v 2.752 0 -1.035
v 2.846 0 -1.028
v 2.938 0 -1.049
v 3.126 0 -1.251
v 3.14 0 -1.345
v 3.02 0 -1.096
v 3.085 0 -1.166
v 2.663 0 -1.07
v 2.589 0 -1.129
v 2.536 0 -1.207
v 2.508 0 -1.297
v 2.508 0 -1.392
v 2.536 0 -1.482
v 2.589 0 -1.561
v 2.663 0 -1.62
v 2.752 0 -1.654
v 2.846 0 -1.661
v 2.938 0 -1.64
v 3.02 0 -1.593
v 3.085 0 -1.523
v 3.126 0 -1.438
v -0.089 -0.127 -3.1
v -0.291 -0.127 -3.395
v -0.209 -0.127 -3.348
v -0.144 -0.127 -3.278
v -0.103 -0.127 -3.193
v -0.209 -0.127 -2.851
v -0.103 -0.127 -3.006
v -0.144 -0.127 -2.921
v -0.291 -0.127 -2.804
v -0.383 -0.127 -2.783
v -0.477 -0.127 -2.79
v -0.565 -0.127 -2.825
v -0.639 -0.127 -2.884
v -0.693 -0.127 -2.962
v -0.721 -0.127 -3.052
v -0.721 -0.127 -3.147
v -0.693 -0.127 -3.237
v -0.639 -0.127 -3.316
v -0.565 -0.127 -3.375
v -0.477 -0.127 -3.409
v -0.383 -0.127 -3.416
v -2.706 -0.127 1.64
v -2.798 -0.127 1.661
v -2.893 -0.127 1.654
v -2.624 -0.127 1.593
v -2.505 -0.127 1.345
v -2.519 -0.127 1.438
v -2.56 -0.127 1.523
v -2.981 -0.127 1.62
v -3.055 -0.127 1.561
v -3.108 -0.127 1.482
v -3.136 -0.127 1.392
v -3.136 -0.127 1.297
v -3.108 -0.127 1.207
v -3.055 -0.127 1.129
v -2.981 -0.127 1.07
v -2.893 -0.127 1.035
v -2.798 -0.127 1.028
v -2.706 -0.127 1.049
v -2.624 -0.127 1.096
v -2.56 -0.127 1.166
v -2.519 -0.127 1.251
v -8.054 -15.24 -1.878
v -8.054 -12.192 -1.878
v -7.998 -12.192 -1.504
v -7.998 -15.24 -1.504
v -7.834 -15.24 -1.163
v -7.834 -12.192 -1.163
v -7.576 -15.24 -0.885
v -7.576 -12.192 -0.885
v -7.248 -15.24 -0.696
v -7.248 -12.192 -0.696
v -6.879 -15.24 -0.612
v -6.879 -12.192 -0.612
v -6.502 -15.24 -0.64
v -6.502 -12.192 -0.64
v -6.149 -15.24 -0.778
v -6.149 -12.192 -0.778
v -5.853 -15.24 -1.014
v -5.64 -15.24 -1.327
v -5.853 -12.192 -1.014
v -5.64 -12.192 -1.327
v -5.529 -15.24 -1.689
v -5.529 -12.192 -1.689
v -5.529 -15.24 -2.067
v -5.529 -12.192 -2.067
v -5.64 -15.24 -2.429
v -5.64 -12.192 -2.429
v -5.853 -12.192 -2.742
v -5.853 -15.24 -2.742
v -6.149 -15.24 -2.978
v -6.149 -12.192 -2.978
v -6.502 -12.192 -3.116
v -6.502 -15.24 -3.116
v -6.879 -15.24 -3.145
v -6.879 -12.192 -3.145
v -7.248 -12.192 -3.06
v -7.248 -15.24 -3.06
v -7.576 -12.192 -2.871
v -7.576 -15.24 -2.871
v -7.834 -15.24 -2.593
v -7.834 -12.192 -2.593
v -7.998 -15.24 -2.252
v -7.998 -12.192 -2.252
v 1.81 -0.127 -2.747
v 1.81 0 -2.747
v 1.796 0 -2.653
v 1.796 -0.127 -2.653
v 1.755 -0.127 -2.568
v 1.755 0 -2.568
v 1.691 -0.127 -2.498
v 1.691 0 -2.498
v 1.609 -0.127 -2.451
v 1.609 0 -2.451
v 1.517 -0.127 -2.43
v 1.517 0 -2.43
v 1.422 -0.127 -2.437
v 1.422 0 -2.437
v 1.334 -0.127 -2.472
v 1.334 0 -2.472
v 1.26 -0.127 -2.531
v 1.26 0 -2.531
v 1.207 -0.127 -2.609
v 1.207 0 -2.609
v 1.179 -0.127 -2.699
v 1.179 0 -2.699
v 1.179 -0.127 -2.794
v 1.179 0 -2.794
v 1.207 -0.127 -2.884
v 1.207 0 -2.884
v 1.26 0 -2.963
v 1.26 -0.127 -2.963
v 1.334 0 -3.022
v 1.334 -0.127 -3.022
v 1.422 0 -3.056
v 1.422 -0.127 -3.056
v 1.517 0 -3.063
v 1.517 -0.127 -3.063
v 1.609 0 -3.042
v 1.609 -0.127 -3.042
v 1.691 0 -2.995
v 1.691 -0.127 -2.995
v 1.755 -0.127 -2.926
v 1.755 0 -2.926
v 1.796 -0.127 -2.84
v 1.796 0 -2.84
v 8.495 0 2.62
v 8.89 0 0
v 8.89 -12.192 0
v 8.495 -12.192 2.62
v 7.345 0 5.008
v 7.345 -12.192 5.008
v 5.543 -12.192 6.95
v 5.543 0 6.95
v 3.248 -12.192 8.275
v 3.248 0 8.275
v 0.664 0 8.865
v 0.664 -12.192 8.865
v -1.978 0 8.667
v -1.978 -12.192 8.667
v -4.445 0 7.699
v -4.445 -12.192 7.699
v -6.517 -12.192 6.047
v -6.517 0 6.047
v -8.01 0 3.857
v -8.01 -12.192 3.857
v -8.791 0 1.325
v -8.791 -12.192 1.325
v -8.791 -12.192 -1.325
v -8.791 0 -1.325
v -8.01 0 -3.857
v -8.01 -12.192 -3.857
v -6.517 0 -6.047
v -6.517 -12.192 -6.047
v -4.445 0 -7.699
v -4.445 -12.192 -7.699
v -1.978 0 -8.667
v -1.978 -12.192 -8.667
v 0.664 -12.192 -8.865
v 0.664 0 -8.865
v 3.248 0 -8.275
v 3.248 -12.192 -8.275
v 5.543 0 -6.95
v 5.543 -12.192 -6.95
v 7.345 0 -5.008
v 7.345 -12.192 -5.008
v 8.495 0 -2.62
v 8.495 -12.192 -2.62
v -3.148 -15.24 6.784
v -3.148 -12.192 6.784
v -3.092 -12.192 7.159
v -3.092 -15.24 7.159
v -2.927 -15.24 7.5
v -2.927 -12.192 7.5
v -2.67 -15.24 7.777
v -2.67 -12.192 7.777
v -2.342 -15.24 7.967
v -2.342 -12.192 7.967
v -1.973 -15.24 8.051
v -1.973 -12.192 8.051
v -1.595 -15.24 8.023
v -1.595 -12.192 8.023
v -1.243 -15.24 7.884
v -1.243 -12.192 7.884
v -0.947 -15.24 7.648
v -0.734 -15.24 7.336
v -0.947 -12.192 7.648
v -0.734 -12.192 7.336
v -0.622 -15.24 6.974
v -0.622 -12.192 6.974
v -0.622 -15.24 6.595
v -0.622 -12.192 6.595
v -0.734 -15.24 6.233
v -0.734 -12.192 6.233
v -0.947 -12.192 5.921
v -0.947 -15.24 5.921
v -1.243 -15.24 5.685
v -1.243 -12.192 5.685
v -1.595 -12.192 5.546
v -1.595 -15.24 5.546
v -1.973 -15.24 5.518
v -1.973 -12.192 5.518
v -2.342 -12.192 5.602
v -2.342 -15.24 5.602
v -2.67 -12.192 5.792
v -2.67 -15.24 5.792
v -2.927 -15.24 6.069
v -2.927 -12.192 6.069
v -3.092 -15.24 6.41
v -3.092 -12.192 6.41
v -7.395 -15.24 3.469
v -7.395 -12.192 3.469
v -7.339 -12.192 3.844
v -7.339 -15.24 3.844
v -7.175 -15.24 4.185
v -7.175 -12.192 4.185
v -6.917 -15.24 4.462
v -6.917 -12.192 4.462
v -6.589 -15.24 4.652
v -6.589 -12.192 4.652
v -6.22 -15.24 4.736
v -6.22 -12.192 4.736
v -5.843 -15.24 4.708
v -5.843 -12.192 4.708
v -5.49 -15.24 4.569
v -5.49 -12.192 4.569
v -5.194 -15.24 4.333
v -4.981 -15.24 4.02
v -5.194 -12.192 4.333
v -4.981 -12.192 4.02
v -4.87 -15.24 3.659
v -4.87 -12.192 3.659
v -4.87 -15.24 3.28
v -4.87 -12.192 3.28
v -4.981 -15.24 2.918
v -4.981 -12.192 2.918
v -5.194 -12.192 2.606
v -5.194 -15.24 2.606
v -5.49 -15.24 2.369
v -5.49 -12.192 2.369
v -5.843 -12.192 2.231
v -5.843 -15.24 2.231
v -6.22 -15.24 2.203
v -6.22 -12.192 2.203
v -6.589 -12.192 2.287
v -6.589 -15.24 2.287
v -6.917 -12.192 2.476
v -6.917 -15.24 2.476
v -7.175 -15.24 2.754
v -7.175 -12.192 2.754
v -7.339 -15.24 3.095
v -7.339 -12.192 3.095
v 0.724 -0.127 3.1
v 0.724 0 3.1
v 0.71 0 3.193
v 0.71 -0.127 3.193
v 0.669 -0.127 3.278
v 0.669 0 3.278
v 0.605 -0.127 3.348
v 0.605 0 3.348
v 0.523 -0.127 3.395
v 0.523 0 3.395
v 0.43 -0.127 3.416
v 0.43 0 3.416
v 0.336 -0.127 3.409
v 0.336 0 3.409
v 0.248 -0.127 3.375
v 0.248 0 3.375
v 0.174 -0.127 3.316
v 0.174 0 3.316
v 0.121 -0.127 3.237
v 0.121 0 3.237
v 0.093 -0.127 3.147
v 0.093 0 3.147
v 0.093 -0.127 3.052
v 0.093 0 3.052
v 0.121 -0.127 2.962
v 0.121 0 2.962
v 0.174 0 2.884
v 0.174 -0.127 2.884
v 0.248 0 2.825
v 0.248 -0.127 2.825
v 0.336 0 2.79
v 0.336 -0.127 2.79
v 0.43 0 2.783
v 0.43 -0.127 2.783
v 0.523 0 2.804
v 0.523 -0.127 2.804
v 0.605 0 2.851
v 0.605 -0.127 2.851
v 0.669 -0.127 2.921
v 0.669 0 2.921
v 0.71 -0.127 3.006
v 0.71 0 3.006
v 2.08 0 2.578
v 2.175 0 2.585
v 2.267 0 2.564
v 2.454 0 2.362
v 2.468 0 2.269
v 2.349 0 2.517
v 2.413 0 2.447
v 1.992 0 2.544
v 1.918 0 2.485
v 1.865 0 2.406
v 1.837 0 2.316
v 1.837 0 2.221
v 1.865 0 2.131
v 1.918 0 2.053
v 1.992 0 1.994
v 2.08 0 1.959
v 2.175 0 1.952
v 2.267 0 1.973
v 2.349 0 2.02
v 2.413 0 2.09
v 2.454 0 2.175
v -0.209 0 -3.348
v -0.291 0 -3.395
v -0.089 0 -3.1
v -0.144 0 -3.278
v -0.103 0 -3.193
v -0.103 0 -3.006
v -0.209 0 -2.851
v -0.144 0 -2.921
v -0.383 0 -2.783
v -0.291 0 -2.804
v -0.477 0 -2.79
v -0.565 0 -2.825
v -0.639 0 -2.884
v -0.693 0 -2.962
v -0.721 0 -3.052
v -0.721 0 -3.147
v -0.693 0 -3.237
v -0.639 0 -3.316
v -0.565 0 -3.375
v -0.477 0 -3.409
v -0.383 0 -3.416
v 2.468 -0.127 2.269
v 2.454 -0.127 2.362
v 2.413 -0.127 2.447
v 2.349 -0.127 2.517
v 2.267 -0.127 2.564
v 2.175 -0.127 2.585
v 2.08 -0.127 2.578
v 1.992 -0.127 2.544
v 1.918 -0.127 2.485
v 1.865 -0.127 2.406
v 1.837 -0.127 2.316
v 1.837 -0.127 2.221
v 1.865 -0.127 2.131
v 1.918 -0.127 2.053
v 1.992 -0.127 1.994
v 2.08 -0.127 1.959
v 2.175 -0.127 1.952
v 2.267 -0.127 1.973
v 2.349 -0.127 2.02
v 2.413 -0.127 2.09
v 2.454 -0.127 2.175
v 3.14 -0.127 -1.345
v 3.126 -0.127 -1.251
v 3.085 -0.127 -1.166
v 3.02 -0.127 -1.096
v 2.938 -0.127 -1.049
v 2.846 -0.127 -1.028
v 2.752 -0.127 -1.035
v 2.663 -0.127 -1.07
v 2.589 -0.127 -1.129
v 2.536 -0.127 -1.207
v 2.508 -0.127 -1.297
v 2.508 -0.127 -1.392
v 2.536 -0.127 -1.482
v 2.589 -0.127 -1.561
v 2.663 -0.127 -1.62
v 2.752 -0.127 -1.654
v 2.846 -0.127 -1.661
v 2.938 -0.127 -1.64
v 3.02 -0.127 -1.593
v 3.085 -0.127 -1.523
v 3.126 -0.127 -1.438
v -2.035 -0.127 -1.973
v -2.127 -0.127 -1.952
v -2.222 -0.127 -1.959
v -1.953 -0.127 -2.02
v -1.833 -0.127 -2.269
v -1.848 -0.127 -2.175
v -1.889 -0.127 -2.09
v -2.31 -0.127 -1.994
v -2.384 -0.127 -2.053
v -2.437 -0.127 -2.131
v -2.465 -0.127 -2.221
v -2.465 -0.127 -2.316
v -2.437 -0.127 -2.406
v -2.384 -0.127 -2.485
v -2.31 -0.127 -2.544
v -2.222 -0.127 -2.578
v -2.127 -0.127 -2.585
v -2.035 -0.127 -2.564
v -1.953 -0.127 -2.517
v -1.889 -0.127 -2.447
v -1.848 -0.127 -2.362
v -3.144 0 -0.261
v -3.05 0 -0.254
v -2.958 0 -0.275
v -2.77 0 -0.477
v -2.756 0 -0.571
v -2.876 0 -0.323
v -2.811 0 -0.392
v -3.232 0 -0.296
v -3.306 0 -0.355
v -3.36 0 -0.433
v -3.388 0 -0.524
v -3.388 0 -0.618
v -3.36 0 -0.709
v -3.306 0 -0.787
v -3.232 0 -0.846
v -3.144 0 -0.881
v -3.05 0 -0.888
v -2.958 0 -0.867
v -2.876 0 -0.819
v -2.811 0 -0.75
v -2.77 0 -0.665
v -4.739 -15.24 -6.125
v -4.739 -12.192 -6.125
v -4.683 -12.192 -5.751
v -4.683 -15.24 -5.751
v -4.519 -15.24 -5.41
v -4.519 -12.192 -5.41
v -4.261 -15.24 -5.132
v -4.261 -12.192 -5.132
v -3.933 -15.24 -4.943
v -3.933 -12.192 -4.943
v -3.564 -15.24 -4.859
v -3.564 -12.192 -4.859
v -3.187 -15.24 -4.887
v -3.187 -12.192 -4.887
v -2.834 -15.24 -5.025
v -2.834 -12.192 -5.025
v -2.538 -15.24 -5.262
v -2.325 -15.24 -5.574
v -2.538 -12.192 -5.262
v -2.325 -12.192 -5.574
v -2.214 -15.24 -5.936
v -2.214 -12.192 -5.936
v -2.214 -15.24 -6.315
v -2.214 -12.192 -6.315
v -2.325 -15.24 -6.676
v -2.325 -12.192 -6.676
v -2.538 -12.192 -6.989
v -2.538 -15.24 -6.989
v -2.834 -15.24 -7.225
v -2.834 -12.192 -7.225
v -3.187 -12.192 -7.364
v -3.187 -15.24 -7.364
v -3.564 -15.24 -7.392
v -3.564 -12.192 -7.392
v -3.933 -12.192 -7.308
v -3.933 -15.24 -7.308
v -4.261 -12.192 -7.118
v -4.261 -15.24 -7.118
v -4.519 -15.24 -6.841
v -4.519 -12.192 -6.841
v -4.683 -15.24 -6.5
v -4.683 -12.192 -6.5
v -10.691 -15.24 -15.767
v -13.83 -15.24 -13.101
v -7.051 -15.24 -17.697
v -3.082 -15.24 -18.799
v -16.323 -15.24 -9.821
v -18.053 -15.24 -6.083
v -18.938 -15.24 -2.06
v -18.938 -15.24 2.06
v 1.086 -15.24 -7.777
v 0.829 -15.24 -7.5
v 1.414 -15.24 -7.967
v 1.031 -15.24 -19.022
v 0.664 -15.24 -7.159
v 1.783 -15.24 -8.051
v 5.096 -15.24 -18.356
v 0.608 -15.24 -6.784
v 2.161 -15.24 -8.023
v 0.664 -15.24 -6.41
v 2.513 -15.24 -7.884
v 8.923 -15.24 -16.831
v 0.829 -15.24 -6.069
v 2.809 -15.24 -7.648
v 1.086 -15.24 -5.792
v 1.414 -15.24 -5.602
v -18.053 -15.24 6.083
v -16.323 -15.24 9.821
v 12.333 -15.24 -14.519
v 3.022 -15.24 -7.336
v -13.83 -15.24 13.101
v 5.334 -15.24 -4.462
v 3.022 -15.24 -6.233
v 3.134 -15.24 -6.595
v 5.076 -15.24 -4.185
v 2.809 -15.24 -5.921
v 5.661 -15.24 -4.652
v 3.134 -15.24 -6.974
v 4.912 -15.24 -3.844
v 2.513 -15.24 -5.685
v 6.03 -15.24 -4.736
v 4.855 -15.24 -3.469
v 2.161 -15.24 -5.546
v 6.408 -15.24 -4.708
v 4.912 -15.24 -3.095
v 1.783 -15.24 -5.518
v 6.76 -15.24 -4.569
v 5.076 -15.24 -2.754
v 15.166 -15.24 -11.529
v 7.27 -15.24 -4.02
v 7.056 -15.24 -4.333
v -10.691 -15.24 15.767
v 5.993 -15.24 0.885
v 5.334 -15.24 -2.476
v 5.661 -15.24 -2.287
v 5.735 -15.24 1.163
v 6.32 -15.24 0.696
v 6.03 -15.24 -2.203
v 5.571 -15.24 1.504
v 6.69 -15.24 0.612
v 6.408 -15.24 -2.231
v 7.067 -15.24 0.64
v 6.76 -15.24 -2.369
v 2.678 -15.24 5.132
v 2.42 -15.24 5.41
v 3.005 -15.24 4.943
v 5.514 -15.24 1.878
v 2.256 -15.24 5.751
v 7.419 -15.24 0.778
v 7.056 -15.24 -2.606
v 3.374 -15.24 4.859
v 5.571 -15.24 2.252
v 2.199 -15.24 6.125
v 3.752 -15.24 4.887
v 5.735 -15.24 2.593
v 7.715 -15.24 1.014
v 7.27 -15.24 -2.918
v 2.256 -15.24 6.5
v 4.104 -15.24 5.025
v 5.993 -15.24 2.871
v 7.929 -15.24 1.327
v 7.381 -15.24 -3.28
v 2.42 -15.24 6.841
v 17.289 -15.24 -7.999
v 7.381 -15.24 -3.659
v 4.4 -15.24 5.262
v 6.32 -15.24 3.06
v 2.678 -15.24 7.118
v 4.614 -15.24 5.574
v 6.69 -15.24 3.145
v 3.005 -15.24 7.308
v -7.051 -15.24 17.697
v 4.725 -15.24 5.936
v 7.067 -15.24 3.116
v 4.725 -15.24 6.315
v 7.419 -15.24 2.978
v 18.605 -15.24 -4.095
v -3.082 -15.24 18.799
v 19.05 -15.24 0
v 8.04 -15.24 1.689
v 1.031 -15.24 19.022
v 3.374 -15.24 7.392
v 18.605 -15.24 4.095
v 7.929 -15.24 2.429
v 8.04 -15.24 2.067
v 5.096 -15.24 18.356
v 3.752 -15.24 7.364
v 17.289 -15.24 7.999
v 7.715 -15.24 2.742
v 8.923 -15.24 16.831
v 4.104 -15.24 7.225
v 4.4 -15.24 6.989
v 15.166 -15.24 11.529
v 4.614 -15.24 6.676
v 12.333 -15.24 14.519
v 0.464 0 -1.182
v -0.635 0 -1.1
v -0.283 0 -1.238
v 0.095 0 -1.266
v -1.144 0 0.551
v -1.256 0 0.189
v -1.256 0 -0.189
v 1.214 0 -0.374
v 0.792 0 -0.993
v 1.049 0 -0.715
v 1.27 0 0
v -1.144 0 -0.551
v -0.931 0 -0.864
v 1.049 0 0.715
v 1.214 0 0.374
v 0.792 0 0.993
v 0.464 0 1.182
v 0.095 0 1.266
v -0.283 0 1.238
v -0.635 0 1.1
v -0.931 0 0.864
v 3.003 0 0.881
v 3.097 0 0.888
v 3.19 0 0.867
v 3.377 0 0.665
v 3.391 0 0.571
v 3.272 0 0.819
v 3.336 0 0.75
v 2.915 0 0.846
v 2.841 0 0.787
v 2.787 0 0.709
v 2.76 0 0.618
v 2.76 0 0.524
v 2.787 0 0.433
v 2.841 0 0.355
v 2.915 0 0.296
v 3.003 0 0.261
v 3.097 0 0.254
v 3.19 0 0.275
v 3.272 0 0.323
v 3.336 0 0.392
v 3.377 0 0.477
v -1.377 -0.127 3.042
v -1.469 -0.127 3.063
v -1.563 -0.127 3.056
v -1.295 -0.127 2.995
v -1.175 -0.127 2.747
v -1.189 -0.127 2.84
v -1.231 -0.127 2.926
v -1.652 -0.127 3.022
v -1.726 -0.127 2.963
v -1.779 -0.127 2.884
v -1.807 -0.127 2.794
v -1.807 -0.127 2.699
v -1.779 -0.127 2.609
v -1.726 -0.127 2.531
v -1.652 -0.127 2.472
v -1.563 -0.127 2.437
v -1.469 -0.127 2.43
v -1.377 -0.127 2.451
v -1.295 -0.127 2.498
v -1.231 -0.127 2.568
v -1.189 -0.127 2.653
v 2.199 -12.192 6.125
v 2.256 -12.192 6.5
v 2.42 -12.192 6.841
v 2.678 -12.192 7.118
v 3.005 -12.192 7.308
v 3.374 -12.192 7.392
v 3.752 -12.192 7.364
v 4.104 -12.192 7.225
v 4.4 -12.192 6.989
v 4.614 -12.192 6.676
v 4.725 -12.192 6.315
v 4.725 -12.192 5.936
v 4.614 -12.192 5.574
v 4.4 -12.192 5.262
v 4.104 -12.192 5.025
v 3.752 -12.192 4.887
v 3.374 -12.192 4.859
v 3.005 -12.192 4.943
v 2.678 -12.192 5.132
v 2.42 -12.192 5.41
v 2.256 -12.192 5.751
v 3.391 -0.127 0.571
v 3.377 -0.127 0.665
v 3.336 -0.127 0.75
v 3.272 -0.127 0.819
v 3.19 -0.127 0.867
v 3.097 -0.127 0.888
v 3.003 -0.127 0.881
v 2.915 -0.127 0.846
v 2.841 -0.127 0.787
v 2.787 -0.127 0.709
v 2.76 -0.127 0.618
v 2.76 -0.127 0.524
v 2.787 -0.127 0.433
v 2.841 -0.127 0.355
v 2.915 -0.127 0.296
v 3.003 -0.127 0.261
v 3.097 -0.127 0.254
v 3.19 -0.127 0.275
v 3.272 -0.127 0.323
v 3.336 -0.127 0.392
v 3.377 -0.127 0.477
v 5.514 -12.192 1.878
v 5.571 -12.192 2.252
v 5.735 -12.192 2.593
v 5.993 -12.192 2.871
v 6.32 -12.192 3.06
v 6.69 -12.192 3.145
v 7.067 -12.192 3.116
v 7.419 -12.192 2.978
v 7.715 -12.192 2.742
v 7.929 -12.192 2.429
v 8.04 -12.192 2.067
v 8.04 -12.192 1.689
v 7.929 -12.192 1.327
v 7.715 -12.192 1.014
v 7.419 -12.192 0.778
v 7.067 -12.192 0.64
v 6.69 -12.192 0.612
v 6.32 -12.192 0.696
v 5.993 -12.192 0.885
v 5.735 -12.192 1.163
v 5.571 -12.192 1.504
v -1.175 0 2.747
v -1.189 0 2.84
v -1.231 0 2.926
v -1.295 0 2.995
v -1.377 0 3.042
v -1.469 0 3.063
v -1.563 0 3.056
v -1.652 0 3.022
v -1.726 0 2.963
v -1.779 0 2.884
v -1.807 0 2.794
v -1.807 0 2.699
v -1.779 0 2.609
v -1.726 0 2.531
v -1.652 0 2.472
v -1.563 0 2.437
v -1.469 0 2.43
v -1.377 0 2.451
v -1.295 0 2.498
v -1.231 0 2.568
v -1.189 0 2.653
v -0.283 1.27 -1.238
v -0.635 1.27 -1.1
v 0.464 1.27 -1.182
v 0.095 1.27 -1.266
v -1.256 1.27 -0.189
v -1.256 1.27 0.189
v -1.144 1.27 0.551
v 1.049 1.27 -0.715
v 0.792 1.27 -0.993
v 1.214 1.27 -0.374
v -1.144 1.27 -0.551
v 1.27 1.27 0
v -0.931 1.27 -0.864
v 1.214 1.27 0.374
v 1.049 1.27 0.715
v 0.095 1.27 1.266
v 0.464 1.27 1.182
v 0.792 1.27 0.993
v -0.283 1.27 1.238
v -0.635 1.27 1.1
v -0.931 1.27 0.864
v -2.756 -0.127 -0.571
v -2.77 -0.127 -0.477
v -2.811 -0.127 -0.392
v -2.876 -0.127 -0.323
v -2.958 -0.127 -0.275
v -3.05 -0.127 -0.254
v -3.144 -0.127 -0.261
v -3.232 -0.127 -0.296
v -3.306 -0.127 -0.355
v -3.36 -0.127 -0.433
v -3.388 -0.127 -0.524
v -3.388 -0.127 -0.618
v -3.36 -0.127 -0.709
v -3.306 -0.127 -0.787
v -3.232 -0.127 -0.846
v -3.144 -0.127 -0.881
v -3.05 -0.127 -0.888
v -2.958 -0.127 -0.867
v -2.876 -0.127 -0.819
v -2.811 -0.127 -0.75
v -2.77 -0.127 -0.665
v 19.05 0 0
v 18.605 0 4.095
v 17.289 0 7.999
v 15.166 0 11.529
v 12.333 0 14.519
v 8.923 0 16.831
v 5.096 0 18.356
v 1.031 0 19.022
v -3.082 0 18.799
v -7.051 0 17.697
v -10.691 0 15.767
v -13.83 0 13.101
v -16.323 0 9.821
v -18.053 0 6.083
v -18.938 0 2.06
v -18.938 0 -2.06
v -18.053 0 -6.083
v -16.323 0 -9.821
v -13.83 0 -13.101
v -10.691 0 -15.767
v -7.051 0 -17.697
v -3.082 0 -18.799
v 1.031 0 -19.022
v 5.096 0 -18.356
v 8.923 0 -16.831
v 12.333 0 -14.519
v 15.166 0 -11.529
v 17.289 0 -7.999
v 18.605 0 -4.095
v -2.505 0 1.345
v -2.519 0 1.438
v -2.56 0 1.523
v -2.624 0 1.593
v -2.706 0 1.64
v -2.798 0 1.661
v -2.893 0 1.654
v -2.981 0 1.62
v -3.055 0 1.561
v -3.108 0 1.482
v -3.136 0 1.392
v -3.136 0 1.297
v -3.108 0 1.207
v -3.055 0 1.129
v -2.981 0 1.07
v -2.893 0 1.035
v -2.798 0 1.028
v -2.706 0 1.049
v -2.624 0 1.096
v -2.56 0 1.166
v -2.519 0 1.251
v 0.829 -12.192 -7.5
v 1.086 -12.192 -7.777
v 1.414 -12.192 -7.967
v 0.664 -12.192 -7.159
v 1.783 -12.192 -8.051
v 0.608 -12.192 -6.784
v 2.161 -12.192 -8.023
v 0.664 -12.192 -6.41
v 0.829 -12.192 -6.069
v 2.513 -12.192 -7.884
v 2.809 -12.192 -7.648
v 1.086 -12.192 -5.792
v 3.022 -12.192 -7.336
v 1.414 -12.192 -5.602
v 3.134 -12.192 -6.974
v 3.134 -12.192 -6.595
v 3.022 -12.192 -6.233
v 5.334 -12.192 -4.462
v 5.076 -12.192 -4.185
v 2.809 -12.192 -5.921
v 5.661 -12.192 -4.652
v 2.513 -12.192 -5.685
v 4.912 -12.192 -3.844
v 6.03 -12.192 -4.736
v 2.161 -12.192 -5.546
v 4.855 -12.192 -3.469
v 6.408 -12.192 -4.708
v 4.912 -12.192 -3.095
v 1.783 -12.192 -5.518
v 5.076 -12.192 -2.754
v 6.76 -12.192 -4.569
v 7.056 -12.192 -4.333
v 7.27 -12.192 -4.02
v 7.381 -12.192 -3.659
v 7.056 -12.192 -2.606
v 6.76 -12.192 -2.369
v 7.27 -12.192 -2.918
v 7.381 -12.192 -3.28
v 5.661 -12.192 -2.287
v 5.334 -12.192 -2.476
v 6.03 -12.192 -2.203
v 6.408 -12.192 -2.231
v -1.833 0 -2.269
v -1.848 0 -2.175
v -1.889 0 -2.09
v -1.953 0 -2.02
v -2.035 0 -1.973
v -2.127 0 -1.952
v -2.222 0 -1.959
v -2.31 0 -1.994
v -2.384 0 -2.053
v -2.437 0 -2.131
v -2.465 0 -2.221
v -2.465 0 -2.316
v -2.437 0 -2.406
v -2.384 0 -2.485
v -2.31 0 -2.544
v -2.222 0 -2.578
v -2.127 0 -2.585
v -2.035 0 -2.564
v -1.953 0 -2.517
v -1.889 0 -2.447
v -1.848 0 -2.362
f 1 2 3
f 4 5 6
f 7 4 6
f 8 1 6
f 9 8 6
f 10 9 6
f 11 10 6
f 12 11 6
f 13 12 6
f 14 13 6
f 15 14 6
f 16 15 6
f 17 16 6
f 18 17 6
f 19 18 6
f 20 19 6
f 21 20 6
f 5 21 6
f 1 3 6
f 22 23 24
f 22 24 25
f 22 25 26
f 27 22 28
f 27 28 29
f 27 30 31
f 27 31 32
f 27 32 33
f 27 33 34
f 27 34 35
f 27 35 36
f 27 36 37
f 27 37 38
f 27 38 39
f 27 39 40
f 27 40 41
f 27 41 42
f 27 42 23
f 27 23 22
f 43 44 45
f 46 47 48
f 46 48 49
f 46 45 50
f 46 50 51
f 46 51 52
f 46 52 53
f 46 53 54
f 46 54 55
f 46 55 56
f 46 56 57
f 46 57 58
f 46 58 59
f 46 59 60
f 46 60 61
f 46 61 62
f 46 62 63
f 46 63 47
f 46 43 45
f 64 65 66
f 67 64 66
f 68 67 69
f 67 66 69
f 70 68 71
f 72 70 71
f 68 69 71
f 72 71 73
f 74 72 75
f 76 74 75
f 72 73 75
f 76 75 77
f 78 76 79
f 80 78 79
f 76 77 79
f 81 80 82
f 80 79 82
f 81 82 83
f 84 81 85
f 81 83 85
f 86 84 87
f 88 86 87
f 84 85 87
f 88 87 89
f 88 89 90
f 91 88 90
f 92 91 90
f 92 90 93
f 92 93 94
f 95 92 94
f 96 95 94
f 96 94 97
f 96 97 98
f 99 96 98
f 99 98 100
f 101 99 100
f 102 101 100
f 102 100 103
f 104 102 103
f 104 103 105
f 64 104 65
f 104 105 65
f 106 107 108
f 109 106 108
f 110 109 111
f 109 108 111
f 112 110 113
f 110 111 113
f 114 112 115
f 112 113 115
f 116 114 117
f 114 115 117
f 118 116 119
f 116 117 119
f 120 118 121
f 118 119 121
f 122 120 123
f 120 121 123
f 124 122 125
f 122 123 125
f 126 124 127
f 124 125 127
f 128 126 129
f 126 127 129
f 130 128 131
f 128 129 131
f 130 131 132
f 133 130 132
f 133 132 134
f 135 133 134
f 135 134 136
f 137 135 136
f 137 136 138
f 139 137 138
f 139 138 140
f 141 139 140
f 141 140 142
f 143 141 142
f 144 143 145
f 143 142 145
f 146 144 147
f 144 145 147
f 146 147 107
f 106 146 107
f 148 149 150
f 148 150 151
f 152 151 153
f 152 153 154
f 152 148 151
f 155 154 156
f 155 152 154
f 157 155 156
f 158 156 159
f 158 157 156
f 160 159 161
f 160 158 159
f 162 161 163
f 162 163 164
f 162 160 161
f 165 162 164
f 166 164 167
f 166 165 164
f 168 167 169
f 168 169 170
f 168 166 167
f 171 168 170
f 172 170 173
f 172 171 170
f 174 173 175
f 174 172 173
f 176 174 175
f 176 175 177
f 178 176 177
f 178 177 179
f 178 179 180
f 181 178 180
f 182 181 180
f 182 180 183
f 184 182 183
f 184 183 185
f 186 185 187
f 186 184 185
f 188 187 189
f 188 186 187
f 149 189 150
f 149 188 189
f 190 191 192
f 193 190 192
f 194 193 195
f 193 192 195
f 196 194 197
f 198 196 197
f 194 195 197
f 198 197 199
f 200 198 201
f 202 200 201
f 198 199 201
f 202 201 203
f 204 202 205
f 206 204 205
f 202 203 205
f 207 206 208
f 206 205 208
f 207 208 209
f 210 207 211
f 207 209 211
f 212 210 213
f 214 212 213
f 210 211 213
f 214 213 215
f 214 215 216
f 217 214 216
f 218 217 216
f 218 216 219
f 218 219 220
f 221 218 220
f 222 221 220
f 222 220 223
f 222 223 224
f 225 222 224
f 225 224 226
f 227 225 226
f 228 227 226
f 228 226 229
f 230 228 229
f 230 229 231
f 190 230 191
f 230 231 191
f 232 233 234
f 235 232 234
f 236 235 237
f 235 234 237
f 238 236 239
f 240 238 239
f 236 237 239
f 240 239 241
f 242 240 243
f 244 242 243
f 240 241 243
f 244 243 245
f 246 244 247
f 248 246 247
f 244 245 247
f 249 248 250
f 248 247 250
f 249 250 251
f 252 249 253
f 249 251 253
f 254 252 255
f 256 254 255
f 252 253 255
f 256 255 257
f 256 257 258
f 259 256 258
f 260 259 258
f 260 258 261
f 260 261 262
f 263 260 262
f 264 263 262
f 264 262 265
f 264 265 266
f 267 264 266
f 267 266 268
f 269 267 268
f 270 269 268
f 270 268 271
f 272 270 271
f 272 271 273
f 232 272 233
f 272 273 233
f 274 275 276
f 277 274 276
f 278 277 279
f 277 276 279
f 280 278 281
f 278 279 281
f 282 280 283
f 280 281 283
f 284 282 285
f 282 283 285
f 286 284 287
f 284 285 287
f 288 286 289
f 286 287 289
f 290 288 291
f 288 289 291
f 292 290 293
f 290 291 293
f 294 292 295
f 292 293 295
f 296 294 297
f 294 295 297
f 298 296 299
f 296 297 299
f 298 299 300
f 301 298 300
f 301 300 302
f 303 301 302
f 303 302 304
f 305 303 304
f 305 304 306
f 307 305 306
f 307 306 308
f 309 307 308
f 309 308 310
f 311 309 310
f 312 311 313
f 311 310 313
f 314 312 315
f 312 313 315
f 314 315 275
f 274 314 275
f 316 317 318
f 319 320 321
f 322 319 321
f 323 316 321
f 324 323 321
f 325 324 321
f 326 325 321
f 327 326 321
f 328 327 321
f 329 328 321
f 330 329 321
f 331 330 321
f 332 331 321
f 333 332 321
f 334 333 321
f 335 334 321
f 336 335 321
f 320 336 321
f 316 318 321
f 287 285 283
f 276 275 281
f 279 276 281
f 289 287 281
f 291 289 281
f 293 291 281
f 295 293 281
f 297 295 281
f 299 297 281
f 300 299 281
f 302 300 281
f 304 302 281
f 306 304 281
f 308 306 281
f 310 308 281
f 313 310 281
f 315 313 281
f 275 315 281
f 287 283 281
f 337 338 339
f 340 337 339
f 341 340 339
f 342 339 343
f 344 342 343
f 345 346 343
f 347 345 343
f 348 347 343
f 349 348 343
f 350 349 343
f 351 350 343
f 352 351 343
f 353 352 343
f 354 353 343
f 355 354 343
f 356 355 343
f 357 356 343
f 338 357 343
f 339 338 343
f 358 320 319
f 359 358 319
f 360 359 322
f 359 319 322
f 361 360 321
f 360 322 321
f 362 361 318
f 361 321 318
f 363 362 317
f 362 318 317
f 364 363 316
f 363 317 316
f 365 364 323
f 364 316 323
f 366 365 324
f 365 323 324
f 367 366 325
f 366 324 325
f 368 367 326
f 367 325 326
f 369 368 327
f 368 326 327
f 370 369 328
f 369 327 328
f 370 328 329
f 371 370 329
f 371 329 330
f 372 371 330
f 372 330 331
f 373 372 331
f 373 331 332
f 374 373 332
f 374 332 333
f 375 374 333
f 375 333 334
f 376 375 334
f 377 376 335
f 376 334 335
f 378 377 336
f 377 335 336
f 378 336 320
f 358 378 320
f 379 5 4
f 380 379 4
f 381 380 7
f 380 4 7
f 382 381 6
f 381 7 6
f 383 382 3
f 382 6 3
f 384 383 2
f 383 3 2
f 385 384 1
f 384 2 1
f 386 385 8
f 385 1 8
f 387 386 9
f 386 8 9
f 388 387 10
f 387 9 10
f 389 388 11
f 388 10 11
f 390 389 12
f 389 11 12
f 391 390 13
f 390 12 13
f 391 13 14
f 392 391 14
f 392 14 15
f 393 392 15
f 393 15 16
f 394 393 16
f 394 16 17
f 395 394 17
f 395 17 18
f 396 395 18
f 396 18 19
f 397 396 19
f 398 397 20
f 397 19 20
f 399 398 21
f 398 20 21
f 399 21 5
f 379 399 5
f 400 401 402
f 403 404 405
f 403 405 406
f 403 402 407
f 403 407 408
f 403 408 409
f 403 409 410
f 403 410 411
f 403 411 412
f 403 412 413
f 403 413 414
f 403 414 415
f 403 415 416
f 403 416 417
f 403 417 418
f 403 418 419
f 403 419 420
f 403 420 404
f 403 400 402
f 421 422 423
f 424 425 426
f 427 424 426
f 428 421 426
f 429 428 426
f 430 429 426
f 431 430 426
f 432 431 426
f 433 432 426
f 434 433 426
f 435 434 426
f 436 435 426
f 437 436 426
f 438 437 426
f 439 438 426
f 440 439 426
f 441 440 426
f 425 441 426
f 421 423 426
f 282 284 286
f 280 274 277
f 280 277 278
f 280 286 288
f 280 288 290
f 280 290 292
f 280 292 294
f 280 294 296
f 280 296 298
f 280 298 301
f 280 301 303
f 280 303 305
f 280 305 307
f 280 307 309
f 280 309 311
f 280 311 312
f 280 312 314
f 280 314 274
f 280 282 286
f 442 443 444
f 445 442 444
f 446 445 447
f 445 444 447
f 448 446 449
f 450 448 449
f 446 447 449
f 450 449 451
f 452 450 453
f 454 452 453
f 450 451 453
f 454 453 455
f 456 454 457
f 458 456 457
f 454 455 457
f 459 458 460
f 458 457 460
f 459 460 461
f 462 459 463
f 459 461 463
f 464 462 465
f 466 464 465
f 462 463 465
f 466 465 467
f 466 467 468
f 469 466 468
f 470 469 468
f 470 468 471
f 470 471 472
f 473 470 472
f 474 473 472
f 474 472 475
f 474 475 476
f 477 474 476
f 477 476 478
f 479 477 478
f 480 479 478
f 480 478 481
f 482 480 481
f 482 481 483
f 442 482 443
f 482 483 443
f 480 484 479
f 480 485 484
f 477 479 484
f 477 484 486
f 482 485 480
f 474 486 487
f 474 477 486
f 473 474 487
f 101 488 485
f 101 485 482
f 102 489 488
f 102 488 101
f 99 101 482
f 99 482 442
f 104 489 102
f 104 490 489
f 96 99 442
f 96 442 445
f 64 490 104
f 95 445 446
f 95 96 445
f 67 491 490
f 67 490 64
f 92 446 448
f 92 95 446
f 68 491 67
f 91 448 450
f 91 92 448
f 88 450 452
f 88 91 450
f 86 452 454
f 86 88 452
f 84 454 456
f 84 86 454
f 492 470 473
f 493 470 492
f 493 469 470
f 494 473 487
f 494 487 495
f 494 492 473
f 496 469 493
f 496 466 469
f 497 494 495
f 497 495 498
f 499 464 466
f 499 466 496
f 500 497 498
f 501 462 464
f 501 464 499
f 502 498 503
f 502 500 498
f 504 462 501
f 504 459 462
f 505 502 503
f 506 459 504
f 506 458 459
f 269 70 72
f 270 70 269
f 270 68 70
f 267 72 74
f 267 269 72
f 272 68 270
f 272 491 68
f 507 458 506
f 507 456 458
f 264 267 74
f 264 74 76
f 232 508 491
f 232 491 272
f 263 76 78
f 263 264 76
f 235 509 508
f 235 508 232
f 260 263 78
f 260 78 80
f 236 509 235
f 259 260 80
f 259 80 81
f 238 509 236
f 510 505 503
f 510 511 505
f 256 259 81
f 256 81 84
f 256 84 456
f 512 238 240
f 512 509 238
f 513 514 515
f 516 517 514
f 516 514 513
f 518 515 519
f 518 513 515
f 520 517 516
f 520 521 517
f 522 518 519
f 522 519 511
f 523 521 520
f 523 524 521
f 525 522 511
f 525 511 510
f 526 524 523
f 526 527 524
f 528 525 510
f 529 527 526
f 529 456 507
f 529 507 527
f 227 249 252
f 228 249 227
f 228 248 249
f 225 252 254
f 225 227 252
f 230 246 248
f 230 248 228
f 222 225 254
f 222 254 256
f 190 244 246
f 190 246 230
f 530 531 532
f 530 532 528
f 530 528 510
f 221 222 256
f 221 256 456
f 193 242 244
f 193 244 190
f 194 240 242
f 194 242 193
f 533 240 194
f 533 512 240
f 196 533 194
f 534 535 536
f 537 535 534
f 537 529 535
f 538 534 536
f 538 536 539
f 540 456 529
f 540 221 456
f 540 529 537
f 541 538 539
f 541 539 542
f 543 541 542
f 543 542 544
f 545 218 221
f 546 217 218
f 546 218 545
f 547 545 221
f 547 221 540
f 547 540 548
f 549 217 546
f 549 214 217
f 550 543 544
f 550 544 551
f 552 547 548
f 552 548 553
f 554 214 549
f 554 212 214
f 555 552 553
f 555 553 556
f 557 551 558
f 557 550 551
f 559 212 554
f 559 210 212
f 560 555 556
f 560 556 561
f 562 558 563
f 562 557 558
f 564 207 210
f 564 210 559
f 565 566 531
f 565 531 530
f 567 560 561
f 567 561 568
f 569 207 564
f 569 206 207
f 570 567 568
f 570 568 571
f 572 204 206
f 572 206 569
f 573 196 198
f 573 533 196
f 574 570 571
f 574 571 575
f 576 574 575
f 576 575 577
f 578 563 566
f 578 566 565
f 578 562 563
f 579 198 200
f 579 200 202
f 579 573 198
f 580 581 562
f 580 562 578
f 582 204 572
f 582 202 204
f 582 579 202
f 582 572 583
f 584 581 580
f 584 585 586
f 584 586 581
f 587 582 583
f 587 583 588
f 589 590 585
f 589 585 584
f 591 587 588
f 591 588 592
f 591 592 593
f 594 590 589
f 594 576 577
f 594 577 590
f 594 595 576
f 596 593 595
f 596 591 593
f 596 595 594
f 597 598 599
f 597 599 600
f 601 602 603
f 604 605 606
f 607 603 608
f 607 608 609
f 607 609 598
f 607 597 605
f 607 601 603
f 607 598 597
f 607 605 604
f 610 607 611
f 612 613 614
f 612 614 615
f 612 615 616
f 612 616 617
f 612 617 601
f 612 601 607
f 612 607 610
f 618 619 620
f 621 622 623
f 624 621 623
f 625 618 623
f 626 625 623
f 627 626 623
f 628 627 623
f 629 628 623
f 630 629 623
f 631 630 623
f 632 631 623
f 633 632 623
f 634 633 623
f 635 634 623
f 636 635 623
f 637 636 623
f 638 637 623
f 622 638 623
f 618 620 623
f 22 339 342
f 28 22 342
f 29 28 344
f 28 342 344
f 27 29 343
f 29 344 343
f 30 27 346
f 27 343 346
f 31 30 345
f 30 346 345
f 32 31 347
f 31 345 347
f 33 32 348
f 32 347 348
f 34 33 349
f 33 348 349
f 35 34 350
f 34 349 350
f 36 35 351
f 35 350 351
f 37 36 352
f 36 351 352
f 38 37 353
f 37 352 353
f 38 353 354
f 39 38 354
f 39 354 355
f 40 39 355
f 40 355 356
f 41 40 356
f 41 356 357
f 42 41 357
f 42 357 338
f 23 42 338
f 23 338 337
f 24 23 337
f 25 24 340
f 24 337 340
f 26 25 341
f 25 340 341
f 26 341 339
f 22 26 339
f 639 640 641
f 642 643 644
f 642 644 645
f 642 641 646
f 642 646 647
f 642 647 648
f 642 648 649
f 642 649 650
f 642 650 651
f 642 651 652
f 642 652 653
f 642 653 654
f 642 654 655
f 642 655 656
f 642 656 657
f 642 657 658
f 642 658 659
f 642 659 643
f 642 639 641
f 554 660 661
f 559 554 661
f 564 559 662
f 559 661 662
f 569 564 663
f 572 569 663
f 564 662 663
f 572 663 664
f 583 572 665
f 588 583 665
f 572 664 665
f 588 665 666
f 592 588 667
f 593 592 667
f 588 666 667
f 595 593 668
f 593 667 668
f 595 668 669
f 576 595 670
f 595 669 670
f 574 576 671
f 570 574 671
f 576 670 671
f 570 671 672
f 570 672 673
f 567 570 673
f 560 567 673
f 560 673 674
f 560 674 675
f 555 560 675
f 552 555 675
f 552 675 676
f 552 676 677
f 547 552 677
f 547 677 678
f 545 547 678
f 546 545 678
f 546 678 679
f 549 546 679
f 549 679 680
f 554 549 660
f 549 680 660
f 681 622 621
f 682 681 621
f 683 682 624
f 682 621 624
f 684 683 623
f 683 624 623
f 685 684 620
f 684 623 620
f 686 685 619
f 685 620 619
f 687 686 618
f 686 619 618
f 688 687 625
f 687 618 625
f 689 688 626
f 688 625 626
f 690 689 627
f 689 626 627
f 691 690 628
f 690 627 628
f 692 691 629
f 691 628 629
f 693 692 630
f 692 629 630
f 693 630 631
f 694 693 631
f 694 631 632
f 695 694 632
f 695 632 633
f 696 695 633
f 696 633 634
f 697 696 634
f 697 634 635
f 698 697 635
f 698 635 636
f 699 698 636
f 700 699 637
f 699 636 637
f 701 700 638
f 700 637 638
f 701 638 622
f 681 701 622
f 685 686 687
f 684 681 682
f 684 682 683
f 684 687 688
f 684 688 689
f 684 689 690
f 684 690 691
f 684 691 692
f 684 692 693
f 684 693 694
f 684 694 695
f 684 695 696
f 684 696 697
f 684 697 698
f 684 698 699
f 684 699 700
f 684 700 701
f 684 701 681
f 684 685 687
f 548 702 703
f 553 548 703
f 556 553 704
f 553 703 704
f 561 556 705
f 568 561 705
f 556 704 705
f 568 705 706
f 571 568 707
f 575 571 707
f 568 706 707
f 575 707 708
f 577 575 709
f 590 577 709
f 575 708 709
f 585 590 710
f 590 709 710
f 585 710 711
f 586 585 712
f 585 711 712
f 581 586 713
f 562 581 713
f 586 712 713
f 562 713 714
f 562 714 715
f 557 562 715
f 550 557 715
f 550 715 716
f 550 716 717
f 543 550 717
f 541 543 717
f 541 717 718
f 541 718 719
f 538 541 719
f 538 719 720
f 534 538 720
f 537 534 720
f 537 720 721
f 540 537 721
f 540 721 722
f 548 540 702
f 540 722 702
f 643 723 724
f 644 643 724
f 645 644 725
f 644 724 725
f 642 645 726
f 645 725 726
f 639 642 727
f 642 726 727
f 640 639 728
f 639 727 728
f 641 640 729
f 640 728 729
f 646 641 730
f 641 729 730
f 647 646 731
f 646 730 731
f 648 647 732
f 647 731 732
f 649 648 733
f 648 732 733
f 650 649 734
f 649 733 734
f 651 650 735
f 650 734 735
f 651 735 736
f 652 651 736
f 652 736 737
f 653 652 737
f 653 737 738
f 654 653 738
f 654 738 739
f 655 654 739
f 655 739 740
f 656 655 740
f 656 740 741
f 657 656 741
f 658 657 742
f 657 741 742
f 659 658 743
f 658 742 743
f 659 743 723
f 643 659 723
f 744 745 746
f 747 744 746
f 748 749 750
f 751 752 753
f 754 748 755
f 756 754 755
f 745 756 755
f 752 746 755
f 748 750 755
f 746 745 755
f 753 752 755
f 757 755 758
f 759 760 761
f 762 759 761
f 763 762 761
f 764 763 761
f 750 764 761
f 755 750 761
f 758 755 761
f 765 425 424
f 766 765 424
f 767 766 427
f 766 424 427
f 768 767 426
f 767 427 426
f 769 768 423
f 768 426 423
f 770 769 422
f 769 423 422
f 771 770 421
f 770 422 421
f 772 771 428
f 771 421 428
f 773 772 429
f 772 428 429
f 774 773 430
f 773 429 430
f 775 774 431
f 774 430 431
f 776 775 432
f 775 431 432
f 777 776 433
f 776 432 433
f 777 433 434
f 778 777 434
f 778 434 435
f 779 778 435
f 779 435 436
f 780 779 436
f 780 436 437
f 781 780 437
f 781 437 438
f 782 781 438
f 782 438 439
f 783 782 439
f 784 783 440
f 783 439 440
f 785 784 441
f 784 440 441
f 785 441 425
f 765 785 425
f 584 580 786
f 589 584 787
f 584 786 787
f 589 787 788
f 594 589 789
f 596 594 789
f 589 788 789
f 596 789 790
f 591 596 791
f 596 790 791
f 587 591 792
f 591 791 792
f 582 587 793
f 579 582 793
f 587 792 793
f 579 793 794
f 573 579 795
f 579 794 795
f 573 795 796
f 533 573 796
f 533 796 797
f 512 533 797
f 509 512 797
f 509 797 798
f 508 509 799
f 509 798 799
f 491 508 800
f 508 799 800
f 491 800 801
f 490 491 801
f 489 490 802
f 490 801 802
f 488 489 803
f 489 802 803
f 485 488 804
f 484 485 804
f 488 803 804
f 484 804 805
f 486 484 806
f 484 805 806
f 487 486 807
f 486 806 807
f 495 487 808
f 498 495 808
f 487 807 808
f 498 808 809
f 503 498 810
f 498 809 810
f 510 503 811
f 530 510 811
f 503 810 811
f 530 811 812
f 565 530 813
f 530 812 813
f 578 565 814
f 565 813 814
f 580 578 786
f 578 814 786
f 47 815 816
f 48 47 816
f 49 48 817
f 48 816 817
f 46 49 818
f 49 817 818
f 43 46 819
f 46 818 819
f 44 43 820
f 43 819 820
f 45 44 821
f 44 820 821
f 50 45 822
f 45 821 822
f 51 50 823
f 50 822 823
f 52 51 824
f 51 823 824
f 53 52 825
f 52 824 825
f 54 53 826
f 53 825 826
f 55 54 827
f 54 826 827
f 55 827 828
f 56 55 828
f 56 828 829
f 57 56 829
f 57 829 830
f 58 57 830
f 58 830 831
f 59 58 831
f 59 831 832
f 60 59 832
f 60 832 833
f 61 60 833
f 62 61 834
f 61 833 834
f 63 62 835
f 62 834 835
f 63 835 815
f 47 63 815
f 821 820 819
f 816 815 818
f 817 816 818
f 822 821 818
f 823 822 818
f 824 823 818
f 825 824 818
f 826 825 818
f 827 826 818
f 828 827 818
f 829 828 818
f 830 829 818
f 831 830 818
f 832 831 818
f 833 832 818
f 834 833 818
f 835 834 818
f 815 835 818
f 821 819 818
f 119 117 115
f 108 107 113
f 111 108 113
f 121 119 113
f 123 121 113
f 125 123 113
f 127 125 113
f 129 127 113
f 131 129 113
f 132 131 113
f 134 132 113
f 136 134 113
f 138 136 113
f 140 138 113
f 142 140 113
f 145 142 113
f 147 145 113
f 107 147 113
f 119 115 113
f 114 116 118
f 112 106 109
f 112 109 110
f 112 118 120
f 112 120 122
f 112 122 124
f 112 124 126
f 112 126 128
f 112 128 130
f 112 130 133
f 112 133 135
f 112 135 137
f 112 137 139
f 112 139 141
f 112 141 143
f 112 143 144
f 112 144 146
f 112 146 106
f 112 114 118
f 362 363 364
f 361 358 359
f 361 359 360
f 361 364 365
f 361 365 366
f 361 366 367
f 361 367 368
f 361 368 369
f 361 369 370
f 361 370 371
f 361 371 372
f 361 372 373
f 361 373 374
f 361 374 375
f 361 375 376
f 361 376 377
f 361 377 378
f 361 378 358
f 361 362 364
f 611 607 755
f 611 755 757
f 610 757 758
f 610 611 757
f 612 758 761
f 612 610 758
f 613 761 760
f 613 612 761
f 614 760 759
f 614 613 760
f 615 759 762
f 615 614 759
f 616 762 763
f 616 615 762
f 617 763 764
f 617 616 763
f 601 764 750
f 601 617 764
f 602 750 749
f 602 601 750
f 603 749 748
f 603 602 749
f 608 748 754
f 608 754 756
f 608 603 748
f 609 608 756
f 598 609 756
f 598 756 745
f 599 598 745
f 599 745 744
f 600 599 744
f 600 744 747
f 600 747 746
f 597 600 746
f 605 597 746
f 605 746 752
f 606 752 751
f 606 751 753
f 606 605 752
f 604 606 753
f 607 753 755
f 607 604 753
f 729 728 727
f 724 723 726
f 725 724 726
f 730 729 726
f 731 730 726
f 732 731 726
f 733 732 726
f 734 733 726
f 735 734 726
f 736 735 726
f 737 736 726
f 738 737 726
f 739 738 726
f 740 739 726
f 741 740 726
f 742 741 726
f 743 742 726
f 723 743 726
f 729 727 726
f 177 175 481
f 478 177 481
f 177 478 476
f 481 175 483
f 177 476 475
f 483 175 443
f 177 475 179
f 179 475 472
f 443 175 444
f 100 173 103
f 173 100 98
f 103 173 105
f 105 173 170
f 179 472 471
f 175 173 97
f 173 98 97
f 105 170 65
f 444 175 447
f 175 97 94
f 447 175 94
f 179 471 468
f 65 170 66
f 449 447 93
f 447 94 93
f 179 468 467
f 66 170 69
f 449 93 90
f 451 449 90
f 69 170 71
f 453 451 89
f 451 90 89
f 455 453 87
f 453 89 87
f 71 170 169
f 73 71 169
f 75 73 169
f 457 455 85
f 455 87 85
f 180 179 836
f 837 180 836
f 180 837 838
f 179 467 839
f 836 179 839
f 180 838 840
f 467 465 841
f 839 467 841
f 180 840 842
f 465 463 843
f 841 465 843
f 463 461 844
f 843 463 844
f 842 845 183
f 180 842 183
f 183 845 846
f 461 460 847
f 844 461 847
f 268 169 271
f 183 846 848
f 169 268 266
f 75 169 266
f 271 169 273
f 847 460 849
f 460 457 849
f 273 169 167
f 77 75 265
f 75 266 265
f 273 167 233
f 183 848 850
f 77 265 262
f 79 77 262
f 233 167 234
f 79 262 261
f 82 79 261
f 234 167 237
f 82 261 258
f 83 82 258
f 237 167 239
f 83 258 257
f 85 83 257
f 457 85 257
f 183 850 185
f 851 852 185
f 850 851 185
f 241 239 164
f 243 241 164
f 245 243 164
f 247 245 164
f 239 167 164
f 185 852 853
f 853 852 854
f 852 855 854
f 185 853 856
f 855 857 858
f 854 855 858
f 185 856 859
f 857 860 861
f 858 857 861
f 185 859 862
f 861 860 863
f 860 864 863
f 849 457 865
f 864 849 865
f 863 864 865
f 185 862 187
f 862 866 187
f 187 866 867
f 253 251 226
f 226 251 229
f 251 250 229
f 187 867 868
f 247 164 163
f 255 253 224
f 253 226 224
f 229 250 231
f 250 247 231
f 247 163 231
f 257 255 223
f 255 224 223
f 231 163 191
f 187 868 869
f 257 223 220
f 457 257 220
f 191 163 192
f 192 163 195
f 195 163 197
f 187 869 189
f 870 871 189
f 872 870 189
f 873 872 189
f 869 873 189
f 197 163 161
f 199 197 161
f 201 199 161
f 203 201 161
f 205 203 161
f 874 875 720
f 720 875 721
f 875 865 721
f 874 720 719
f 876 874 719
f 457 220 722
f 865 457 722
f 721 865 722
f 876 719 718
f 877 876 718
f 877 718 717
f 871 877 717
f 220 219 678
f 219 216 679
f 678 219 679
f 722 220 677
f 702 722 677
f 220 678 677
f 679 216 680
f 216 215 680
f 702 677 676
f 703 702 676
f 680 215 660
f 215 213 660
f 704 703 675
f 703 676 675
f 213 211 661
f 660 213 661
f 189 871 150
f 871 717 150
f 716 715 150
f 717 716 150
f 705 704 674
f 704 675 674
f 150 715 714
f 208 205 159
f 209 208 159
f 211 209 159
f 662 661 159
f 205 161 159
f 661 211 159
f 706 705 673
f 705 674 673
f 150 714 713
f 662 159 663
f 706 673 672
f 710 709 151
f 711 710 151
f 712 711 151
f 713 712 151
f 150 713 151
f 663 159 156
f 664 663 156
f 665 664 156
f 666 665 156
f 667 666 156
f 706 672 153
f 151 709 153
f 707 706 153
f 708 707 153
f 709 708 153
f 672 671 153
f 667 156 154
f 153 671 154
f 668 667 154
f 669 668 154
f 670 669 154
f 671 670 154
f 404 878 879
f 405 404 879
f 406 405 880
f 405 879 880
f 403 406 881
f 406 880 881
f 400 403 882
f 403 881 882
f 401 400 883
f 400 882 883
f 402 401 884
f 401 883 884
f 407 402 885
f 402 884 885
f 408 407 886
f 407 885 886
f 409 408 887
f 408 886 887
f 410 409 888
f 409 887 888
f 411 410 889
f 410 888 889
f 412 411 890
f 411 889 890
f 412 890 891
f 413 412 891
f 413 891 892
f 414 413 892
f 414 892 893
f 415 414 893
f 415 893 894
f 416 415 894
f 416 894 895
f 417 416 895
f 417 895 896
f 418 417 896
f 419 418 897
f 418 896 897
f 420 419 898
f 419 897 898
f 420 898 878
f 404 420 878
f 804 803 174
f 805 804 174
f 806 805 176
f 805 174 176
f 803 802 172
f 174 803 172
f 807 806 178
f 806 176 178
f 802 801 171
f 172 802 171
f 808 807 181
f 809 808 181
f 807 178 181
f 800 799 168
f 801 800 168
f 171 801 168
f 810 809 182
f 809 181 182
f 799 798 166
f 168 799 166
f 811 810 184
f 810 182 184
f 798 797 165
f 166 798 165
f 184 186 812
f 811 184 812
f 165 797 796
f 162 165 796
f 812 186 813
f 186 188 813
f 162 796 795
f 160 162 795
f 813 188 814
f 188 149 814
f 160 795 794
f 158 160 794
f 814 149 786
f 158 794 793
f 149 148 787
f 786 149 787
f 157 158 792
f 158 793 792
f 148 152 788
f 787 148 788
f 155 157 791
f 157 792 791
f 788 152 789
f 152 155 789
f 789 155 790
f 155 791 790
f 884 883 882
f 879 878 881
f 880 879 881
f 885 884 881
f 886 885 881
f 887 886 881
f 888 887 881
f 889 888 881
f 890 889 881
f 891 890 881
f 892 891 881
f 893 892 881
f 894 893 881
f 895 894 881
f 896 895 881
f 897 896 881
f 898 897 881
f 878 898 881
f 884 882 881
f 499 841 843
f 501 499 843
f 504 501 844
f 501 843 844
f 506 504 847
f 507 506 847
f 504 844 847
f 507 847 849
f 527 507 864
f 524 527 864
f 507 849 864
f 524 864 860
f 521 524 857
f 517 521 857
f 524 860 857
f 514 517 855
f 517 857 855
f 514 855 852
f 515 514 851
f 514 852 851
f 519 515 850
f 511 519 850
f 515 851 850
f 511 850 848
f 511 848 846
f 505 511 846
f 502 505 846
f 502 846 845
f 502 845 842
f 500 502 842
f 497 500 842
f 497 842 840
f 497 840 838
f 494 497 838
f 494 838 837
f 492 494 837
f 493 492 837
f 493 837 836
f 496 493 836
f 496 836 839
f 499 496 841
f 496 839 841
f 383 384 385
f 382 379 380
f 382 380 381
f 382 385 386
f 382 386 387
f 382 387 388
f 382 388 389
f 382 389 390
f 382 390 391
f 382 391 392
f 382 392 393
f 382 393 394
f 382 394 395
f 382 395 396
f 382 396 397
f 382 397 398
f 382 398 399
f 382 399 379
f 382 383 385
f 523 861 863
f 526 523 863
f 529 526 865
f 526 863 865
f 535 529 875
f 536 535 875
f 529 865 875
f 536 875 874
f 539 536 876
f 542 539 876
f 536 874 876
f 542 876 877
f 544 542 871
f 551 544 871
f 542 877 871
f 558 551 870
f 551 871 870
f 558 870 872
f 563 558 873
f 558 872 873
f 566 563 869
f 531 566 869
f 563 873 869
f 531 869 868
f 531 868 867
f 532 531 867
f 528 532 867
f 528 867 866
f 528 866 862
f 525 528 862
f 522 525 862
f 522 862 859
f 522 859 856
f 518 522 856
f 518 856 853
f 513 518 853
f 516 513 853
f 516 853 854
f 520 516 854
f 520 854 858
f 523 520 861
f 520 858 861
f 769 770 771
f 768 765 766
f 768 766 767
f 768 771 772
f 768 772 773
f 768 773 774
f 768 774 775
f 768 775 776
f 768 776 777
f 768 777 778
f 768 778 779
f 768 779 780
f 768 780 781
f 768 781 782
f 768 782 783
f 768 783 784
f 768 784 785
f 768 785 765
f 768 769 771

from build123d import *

# Parameters (mm, degrees)
F0_R      = 19.05
F0_R_2    = 8.89
F1_DEPTH  = 15.24
F2_DEPTH  = 15.24
F3_R      = 8.89
F4_DEPTH  = 12.192
F5_R      = 1.27
F6_DEPTH  = 3.048
F7_R      = 0.3175
F8_DEPTH  = 0.127
F9_R      = 1.27
F10_DEPTH = 1.27


with BuildPart() as f1:
    # F0 (on Front) → F1 (new body)
    with BuildSketch(Plane.XZ):
        Circle(F0_R)
        Circle(F0_R_2, mode=Mode.SUBTRACT)
    extrude(amount=F1_DEPTH)

    # F0 (on Front) → F2 (join)
    with BuildSketch(Plane.XZ):
        Circle(F0_R_2)
    extrude(amount=F2_DEPTH)

    # F3 (on Front) → F4 (cut)
    with BuildSketch(Plane.XZ):
        Circle(F3_R)
    extrude(amount=F4_DEPTH, mode=Mode.SUBTRACT)

    # F5 (on face) → F6 (cut)
    with BuildSketch(Plane(origin=(0, -12.192, 0), x_dir=(-1, 0, 0), z_dir=(0, 1, 0))):
        with Locations((-6.784475, 1.878075)):
            Circle(F5_R)
        with Locations((-3.469349, 6.125348)):
            Circle(F5_R)
        with Locations((1.878075, 6.784475)):
            Circle(F5_R)
        with Locations((6.125348, 3.469349)):
            Circle(F5_R)
        with Locations((3.469349, -6.125348)):
            Circle(F5_R)
        with Locations((6.784475, -1.878075)):
            Circle(F5_R)
        with Locations((-1.878075, -6.784475)):
            Circle(F5_R)
        with Locations((-6.125348, -3.469349)):
            Circle(F5_R)
    extrude(amount=-F6_DEPTH, mode=Mode.SUBTRACT)


with BuildPart() as f8:
    # F7 (on Front) → F8 (new body)
    with BuildSketch(Plane.XZ):
        with Locations((0.406717, 3.099575)):
            Circle(F7_R)
        with Locations((2.150926, 2.268547)):
            Circle(F7_R)
        with Locations((3.073554, 0.571011)):
            Circle(F7_R)
        with Locations((2.822189, -1.344632)):
            Circle(F7_R)
        with Locations((1.492844, -2.746671)):
            Circle(F7_R)
        with Locations((-0.406717, -3.099575)):
            Circle(F7_R)
        with Locations((-2.150926, -2.268547)):
            Circle(F7_R)
        with Locations((-3.073554, -0.571011)):
            Circle(F7_R)
        with Locations((-2.822189, 1.344632)):
            Circle(F7_R)
        with Locations((-1.492844, 2.746671)):
            Circle(F7_R)
    extrude(amount=F8_DEPTH)


with BuildPart() as f10:
    # F9 (on Front) → F10 (new body)
    with BuildSketch(Plane.XZ):
        Circle(F9_R)
    extrude(amount=-F10_DEPTH)


solid = Compound([f1.part, f8.part, f10.part])
